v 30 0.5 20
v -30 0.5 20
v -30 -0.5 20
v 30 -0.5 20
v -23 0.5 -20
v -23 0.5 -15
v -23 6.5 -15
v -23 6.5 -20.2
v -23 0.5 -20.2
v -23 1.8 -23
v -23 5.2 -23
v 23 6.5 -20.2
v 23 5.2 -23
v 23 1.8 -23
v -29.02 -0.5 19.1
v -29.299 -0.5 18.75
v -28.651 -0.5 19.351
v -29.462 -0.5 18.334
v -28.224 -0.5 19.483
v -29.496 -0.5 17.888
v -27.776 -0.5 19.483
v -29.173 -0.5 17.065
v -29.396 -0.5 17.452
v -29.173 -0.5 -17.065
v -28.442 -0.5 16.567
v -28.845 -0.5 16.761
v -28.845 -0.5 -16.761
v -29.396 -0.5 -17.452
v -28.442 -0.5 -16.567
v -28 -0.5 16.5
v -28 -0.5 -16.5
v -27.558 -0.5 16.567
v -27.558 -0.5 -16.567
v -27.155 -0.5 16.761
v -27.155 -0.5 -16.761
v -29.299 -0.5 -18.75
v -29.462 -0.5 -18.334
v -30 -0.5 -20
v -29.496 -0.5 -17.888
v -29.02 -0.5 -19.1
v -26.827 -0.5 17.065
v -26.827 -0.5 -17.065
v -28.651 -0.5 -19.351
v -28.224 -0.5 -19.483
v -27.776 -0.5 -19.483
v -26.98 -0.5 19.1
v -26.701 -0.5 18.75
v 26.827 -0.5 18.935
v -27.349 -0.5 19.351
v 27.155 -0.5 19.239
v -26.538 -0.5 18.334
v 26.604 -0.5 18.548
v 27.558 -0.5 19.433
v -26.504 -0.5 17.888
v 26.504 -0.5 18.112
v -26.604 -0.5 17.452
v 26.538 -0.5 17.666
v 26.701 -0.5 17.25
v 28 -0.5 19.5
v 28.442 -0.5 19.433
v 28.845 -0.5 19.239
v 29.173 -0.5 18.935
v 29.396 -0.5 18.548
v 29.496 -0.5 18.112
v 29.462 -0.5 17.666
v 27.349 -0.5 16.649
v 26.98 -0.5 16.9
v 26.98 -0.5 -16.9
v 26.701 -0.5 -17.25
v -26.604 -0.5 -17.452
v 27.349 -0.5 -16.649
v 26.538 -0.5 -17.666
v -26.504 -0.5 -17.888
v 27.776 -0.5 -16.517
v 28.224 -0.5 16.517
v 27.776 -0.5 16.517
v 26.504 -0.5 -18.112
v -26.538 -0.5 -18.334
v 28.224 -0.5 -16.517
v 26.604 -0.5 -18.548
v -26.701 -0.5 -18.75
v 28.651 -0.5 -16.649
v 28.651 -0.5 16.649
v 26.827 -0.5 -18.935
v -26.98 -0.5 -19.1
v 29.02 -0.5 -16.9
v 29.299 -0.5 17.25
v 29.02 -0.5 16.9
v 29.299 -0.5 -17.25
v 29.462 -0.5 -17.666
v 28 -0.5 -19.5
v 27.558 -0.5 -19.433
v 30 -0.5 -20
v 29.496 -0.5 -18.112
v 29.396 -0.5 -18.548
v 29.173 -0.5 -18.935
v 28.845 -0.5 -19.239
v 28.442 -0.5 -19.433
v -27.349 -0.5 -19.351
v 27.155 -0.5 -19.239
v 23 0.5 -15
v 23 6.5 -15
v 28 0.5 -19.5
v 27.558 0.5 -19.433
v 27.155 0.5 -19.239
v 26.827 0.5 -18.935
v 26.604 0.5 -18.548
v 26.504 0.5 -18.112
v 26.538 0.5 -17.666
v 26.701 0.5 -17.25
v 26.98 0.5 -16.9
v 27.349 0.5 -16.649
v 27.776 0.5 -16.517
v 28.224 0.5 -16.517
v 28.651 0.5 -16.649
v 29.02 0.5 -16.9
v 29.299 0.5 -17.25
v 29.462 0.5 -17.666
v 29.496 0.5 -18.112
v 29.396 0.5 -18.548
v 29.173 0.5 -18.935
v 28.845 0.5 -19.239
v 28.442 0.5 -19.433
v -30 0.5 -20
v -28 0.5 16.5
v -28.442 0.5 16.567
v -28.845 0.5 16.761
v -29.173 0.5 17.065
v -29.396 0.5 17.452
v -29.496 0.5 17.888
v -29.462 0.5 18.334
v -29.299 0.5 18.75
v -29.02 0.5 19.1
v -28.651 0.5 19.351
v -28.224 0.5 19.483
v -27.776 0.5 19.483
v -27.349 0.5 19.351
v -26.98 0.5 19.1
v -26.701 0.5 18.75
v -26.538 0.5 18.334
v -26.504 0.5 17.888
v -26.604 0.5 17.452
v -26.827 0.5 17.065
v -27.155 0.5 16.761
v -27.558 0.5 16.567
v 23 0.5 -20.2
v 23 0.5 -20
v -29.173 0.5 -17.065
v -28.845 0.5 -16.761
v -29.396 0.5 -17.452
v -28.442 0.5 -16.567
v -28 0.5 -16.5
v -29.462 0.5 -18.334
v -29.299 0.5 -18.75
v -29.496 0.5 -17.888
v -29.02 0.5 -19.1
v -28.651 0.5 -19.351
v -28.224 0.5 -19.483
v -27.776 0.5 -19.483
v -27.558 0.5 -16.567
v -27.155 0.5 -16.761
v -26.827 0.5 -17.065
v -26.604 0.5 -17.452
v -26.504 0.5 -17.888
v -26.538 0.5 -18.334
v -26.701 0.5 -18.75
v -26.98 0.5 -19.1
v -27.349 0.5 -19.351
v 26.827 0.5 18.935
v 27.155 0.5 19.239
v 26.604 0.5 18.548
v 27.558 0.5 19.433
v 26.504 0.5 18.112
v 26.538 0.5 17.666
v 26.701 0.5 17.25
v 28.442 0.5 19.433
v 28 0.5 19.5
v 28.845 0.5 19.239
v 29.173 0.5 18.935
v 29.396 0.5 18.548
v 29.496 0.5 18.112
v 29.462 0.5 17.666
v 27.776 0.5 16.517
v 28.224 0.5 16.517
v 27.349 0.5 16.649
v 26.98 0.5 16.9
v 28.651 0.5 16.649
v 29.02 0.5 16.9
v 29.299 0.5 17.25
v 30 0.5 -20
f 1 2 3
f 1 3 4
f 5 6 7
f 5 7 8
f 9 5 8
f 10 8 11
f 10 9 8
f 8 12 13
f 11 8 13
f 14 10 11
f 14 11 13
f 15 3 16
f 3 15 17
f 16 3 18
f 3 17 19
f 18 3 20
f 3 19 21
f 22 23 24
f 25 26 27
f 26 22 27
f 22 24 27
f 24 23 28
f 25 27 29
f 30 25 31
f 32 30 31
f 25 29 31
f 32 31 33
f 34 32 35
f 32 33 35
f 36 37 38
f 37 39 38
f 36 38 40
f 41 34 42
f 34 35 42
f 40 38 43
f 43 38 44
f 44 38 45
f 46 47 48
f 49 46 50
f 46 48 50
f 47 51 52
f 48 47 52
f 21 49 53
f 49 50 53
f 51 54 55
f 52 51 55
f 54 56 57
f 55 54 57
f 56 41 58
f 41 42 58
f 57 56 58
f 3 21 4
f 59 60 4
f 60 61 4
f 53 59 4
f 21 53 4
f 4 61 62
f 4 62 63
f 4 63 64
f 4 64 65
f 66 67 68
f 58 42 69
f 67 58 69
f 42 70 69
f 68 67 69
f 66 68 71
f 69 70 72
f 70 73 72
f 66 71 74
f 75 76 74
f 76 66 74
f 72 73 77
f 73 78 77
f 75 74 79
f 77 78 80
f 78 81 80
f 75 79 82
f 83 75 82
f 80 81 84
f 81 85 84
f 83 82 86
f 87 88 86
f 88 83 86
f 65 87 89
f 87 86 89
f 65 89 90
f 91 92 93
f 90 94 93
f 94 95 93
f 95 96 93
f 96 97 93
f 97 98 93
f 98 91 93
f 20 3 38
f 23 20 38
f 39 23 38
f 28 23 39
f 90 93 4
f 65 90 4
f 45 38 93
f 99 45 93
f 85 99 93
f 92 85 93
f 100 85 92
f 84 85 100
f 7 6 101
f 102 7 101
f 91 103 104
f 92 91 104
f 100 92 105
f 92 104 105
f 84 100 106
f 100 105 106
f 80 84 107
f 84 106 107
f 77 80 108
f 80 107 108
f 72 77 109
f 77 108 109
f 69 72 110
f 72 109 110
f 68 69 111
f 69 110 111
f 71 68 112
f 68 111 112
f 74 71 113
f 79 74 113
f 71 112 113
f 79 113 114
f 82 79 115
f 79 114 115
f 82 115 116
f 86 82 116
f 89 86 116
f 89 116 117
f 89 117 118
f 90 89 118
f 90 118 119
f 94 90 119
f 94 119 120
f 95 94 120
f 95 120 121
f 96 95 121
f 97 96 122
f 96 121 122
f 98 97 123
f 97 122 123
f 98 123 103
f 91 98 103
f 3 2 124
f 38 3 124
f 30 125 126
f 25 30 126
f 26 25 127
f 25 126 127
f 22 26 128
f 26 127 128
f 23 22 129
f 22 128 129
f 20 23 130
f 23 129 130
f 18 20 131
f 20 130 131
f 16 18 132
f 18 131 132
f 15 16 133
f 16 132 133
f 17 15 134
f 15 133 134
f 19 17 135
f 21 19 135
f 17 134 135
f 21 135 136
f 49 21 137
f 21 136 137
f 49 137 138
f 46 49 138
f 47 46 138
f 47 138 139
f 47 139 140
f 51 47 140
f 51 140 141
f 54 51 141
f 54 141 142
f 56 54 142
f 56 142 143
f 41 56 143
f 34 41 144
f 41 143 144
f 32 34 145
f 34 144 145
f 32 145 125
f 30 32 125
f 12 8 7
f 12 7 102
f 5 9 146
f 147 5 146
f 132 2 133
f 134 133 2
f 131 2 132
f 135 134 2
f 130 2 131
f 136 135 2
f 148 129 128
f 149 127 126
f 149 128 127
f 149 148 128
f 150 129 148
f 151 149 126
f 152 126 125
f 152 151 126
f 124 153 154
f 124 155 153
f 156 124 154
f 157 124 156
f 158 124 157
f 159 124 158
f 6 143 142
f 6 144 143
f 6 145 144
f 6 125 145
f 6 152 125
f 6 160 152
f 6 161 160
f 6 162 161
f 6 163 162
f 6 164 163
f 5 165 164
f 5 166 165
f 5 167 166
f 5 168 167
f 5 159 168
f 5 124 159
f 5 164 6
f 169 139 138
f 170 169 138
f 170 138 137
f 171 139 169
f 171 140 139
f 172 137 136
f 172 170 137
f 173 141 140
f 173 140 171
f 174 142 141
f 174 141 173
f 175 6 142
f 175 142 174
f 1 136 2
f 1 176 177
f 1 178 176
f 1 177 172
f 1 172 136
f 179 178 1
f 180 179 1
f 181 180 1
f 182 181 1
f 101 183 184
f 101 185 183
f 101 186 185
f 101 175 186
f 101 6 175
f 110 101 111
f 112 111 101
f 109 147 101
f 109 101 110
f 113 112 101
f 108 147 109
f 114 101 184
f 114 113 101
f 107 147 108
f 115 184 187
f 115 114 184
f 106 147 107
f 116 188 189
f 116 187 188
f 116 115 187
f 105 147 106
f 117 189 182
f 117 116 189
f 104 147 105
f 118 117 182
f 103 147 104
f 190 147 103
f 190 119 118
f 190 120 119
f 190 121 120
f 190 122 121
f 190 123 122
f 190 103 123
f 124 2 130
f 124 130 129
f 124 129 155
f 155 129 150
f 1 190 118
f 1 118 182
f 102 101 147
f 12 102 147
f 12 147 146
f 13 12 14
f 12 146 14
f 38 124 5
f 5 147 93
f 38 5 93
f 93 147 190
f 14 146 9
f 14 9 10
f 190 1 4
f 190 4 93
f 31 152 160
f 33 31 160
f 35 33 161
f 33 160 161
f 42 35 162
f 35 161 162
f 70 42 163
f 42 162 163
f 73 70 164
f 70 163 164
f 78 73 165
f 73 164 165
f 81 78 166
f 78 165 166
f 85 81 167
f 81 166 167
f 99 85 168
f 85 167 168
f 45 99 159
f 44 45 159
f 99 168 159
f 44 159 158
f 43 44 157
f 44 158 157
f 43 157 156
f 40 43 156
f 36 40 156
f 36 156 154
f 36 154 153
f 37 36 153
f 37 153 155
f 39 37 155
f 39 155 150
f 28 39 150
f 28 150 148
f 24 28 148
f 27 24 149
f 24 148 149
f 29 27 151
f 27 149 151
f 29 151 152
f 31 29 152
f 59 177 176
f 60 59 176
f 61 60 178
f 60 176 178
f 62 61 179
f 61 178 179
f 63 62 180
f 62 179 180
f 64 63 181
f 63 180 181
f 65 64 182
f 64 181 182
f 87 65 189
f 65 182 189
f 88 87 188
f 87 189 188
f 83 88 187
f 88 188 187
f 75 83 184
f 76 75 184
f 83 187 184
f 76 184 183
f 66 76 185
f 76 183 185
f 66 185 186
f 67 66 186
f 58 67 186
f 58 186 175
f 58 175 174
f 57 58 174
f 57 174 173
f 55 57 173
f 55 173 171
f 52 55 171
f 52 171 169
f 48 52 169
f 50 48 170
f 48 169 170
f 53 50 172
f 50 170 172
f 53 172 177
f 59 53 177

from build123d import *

# Parameters (mm, degrees)
SKETCH1_W           = 60
SKETCH1_H           = 40
BOSS_EXTRUDE1_DEPTH = 0.5
SKETCH2_R           = 1.5
CUT_EXTRUDE1_DEPTH  = 1
SKETCH3_W           = 46
SKETCH3_H           = 8
BOSS_EXTRUDE2_DEPTH = 6
CUT_EXTRUDE2_DEPTH  = 59.139917441


with BuildPart() as part:
    # Sketch1 → Boss-Extrude1 (new, symmetric)
    with BuildSketch(Plane(origin=(0, 0, 0), x_dir=(1, 0, 0), z_dir=(0, 1, 0))):
        Rectangle(SKETCH1_W, SKETCH1_H)
    extrude(amount=BOSS_EXTRUDE1_DEPTH, both=True)

    # Sketch2 → Cut-Extrude1 (cut)
    with BuildSketch(Plane(origin=(0, 0.5, 0), x_dir=(1, 0, 0), z_dir=(0, 1, 0))):
        with Locations(Location((-28, 18, 0), (0, 0, 270))):
            Circle(SKETCH2_R)
        with Locations(Location((28, 18, 0), (0, 0, 90))):
            Circle(SKETCH2_R)
        with Locations(Location((28, -18, 0), (0, 0, 270))):
            Circle(SKETCH2_R)
        with Locations(Location((-28, -18, 0), (0, 0, 90))):
            Circle(SKETCH2_R)
    extrude(amount=-CUT_EXTRUDE1_DEPTH, mode=Mode.SUBTRACT)

    # Sketch3 → Boss-Extrude2 (add)
    with BuildSketch(Plane(origin=(0, 0.5, 0), x_dir=(1, 0, 0), z_dir=(0, 1, 0))):
        with Locations((0, 19)):
            Rectangle(SKETCH3_W, SKETCH3_H)
    extrude(amount=BOSS_EXTRUDE2_DEPTH)

    # Sketch4 → Cut-Extrude2 (cut, through all)
    with BuildSketch(Plane(origin=(23, 0, 0), x_dir=(0, 0, -1), z_dir=(1, 0, 0))):
        Polygon((23, 5.2), (23, 6.5), (20.2, 6.5), align=None)
        Polygon((20.2, 0.5), (23, 1.8), (23, 0.5), align=None)
    extrude(amount=-CUT_EXTRUDE2_DEPTH, mode=Mode.SUBTRACT)


solid = part.part
